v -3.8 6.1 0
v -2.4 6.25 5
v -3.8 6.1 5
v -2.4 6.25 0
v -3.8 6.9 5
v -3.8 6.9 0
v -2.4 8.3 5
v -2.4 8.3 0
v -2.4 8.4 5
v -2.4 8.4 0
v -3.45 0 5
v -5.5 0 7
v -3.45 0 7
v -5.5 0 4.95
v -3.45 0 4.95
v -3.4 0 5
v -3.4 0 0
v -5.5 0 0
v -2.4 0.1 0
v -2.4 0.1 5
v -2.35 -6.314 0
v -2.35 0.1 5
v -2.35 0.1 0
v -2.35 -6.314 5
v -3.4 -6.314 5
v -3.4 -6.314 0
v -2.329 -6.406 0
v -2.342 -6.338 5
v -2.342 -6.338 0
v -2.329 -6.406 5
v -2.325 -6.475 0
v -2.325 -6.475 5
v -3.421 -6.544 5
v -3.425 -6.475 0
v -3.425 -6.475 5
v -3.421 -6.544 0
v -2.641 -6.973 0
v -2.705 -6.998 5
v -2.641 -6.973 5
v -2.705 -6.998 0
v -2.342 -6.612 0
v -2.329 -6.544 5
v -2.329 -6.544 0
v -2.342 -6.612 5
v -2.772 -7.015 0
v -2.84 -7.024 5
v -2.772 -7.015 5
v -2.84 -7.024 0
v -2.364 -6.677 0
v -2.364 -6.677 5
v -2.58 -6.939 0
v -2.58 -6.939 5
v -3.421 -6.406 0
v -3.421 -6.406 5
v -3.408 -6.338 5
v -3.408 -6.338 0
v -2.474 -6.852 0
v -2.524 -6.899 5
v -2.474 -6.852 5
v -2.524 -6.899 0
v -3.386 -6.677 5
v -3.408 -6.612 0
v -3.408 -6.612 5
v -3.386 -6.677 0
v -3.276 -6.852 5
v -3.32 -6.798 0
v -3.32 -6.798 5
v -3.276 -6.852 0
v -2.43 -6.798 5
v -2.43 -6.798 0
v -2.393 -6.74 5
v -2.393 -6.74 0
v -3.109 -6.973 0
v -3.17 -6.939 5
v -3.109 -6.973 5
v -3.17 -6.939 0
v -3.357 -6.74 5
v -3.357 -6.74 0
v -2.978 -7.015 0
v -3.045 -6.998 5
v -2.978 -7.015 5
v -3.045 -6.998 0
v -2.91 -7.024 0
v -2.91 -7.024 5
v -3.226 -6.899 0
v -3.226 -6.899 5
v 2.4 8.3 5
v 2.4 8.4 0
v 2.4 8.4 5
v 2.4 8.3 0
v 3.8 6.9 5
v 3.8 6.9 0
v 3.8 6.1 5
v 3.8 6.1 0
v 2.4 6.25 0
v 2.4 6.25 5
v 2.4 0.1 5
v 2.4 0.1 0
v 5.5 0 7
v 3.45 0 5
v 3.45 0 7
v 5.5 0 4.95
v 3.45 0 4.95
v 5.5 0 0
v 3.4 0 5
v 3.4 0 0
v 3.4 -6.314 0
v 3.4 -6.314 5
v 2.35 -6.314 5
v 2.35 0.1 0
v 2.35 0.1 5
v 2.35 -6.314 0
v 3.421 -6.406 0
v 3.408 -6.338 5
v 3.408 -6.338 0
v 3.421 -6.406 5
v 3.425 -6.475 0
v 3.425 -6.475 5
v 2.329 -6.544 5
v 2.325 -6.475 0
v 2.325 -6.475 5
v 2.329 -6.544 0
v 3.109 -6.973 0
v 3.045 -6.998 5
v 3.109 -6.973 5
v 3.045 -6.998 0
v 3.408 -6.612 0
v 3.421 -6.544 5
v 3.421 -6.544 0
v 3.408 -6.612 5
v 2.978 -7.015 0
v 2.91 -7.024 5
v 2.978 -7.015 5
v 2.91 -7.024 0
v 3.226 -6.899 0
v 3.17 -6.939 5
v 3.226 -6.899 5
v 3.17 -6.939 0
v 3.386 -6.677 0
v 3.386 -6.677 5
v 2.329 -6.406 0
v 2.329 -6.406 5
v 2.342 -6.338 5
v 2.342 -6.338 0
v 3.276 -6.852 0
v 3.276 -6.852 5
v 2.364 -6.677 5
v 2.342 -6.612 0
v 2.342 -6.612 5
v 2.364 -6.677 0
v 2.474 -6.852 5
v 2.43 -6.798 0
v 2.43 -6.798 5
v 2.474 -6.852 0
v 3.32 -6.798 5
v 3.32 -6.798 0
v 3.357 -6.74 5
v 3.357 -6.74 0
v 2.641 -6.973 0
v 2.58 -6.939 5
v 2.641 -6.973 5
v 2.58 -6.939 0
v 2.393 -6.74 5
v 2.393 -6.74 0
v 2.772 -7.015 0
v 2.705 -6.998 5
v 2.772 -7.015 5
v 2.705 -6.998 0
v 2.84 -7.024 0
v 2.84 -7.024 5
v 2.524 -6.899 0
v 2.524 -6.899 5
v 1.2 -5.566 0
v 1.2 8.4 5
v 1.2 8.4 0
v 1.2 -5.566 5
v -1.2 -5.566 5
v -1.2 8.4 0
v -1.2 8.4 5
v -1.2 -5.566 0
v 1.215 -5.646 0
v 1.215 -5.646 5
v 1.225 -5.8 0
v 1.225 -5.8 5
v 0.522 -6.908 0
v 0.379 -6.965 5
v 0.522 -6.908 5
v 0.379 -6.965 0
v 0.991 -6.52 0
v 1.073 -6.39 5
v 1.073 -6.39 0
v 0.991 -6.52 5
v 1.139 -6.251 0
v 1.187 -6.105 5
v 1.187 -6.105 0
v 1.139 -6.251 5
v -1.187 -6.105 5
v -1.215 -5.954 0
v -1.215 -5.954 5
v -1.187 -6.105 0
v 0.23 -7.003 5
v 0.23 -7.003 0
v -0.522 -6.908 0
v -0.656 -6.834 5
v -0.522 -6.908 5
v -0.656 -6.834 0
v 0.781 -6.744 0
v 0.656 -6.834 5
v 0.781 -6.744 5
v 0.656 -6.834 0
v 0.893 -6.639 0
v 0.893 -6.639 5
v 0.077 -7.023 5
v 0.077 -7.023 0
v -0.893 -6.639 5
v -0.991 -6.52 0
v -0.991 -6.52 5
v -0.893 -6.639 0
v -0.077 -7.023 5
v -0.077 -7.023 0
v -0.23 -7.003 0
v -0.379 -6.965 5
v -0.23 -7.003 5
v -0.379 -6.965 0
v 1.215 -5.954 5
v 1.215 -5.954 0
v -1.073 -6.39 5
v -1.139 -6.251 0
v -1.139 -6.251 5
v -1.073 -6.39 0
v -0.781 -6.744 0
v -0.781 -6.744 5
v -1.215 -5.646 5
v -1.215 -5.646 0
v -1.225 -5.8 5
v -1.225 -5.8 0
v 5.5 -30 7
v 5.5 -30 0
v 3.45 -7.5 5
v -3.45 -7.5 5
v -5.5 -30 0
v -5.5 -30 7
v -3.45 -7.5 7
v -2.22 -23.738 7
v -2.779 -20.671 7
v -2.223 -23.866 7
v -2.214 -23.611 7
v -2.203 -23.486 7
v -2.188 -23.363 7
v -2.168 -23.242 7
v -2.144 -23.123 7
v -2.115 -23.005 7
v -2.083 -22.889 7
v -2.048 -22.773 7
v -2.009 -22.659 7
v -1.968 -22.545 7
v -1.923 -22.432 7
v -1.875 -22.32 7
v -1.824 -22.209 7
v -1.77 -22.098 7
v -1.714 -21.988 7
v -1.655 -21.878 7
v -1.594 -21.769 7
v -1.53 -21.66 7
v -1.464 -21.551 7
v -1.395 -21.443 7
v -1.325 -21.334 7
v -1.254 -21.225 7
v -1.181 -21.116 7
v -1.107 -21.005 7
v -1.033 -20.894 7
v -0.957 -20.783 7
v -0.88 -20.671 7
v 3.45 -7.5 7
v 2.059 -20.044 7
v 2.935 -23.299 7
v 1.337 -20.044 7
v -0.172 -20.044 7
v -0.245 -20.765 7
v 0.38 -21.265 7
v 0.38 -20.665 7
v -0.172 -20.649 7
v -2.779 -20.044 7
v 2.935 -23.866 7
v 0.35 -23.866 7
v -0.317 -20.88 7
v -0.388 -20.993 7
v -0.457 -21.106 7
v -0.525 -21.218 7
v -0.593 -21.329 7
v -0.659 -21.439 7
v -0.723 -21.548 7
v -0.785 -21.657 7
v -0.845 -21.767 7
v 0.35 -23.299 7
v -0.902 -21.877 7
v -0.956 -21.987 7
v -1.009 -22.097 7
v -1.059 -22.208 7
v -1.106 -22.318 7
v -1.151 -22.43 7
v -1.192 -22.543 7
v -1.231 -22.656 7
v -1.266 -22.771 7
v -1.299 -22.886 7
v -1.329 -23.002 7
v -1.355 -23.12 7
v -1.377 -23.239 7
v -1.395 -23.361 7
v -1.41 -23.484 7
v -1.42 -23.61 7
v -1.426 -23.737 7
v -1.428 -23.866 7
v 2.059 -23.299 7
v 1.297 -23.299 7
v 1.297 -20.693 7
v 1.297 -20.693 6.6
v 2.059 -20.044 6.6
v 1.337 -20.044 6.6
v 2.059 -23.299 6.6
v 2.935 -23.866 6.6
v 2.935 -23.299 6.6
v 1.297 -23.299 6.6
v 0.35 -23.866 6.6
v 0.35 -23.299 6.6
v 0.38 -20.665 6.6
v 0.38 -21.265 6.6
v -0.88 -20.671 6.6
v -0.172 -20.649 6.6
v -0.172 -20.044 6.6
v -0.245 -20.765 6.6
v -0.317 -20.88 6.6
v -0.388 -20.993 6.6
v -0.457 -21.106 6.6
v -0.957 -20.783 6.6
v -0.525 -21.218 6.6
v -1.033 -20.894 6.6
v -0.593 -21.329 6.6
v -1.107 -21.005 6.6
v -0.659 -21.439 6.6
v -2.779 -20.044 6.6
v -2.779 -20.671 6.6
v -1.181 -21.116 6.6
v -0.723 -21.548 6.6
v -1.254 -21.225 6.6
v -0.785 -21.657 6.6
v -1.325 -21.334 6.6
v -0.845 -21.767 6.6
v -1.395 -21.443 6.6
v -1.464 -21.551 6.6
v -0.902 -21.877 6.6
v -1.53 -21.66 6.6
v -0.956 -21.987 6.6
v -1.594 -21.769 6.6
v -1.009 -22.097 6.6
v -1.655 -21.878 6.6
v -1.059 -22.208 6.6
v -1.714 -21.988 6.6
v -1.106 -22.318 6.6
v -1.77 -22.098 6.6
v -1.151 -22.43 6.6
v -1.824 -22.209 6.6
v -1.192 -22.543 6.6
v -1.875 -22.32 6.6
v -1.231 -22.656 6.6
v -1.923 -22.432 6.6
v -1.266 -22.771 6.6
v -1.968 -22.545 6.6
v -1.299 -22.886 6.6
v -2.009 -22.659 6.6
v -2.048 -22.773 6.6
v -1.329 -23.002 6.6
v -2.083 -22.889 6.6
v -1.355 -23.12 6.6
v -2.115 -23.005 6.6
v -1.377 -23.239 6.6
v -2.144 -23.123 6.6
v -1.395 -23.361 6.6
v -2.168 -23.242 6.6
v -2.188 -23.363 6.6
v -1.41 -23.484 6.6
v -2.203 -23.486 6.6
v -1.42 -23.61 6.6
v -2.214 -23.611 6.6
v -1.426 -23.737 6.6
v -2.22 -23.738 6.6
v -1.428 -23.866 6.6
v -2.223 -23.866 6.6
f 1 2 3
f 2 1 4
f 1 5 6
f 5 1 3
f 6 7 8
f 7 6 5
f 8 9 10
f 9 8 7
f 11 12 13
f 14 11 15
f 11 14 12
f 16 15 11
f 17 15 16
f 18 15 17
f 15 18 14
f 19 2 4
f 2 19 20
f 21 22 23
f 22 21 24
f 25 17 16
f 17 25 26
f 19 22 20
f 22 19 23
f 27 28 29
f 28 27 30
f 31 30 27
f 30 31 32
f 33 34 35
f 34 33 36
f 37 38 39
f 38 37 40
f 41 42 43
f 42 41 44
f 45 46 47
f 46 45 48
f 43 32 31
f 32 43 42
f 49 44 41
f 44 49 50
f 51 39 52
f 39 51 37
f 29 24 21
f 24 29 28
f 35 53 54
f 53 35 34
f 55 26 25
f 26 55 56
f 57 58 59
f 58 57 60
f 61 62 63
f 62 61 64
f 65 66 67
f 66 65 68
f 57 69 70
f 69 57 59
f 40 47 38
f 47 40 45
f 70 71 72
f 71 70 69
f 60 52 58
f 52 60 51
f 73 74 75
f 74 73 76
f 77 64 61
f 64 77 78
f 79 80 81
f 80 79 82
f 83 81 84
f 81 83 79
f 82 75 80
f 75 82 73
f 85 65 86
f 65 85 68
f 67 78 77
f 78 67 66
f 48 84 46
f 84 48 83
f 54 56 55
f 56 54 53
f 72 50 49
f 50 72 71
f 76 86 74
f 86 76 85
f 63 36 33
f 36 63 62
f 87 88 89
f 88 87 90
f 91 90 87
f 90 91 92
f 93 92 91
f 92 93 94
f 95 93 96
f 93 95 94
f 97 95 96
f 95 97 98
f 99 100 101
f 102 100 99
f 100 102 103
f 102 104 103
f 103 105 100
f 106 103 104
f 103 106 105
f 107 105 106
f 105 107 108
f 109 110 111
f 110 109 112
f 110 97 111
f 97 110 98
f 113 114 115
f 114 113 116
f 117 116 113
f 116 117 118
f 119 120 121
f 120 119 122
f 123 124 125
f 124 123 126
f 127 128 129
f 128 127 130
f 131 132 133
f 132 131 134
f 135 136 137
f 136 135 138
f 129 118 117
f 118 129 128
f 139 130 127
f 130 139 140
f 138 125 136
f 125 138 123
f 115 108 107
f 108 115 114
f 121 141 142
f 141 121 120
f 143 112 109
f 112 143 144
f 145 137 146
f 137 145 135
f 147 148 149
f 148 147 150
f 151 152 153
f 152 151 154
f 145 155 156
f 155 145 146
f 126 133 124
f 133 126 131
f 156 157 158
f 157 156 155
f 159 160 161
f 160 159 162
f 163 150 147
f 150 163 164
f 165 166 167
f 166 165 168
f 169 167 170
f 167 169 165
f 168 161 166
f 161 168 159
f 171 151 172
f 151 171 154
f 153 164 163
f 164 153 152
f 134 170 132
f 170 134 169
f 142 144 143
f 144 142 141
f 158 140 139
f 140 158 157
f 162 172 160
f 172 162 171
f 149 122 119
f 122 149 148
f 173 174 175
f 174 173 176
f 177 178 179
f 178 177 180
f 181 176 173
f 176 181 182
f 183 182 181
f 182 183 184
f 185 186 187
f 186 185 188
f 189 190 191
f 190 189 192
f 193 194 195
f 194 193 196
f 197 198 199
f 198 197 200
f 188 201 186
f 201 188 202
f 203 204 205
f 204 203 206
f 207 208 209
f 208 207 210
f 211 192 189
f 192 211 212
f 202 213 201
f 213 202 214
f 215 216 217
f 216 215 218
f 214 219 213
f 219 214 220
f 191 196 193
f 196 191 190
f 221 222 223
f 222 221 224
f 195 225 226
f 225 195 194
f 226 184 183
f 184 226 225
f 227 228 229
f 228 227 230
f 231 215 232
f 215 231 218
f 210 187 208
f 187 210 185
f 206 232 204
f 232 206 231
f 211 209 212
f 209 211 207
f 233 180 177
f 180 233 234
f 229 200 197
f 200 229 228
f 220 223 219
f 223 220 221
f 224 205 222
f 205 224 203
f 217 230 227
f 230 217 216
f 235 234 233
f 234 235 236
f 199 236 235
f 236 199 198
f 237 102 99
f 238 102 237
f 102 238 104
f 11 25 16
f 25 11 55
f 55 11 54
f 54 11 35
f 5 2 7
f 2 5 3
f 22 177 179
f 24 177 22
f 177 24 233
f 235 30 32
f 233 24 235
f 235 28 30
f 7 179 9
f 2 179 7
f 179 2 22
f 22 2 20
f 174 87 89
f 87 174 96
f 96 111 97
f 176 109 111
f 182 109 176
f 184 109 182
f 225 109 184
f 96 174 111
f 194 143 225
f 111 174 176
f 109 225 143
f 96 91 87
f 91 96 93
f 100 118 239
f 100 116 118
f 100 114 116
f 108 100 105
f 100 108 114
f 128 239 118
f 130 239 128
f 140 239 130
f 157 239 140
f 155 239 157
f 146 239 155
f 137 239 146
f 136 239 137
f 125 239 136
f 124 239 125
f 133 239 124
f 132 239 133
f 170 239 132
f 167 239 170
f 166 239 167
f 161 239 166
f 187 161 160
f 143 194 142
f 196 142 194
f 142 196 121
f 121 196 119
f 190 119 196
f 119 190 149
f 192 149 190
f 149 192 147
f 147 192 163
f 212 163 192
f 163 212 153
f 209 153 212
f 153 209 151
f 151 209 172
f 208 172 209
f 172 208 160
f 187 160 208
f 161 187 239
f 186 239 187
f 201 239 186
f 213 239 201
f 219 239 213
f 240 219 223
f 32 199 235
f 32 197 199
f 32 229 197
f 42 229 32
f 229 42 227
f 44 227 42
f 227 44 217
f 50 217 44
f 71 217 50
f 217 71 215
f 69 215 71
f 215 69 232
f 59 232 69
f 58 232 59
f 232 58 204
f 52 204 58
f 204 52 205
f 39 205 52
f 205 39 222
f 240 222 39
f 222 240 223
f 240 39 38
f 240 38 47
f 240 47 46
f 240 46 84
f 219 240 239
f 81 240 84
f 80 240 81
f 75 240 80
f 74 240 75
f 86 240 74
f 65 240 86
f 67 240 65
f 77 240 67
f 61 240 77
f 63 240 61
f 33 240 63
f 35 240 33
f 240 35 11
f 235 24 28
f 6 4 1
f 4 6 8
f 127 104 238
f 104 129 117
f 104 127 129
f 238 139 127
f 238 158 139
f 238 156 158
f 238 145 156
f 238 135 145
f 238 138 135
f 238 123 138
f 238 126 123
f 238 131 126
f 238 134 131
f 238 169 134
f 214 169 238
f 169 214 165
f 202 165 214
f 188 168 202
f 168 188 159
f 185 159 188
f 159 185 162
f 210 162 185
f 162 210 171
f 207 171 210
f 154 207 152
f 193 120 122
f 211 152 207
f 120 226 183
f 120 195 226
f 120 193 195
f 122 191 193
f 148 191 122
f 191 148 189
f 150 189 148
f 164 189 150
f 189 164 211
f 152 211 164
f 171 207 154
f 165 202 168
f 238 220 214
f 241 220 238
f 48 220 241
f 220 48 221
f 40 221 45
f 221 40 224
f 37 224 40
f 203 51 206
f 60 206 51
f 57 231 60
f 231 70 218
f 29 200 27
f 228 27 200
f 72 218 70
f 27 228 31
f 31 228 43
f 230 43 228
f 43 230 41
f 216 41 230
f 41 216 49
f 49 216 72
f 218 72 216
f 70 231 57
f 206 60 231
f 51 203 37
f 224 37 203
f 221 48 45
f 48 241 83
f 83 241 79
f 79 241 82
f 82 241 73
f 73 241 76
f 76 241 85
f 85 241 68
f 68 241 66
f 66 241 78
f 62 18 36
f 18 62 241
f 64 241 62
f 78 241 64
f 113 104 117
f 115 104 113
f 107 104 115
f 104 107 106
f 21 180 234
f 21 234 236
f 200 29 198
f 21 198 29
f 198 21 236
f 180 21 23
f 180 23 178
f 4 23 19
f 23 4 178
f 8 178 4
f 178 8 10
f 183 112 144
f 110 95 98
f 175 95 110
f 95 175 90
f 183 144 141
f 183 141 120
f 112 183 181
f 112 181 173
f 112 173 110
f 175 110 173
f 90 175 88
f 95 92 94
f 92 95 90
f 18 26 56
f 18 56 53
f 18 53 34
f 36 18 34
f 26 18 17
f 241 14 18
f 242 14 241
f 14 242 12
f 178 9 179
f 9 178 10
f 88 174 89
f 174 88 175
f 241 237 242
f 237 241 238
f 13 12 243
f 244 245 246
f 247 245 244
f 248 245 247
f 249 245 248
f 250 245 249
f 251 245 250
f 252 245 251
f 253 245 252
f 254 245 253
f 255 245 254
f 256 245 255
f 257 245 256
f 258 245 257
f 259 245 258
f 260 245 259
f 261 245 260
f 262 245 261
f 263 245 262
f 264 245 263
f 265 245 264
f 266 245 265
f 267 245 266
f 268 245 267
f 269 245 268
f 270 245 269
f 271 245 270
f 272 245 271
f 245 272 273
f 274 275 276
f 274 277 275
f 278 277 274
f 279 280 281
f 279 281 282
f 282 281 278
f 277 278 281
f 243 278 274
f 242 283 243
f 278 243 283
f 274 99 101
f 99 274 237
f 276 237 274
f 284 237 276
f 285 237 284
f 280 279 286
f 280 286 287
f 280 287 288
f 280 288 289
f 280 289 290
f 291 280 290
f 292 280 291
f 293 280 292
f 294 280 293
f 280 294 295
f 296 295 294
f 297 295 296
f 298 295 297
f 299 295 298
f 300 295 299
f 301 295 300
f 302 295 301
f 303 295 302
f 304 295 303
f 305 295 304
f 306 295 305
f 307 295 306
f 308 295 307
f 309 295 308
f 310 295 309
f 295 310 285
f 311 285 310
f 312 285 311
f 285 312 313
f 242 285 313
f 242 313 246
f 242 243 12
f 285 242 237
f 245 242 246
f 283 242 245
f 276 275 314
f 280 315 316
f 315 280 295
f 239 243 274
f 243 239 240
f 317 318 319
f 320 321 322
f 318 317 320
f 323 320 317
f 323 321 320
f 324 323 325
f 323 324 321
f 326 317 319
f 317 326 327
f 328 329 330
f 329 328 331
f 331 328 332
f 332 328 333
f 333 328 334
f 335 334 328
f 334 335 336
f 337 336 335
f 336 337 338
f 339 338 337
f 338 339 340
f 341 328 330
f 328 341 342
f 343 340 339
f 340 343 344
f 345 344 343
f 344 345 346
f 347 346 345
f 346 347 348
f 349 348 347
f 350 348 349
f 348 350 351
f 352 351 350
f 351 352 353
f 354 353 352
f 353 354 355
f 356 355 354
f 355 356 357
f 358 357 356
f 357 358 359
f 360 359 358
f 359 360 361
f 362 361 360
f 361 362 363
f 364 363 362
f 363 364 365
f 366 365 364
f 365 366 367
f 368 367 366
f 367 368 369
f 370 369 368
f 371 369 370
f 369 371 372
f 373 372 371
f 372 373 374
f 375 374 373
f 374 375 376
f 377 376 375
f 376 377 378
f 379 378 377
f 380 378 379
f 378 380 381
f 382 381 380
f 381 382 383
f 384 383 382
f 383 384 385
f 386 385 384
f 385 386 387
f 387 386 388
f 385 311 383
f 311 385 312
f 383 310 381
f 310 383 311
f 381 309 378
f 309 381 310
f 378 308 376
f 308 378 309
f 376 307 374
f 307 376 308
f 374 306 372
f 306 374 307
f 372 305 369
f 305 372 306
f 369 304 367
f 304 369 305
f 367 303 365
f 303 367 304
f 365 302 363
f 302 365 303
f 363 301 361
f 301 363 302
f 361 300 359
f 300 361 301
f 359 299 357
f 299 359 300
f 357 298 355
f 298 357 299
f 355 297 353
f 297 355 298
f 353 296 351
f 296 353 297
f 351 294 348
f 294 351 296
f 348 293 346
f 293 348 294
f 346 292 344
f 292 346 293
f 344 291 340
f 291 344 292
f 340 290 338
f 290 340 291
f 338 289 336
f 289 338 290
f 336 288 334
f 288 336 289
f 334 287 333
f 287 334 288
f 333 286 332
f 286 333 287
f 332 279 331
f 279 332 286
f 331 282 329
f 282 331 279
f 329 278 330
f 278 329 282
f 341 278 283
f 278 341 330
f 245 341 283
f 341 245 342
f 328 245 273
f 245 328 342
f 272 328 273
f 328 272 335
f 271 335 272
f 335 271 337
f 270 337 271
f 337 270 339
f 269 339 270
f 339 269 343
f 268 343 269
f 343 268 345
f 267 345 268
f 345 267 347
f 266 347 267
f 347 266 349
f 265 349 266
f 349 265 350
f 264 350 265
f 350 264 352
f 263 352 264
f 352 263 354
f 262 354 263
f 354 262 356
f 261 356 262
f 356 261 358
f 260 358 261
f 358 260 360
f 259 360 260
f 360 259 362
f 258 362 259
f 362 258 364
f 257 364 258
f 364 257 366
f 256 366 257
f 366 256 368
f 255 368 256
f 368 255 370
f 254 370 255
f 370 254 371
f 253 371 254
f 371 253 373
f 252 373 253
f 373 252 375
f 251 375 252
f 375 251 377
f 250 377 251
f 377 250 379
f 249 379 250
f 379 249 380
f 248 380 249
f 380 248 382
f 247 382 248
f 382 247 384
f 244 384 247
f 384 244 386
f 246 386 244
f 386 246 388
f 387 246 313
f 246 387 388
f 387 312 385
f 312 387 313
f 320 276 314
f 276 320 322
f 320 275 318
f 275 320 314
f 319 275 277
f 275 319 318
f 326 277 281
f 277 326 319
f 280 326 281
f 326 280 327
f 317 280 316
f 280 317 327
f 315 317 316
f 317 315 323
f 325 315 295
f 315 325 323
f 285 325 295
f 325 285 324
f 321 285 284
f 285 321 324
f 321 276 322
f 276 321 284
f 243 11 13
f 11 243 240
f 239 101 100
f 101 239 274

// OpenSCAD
$fn = 50;

difference() {
	union() {
		translate(v = [0, 0, 0]) {
			rotate(a = [0, 0, 0]) {
				difference() {
					union() {
						translate(v = [0, 0, 0]) {
							rotate(a = [0, 0, 0]) {
								difference() {
									union() {
										translate(v = [-5.5, -30.0, 0]) {
											cube(size = [11.0, 38.4, 5.0]);
										}
									}
									union() {
										translate(v = [0, 0, -0.1]) {
											linear_extrude(height = 5.2) {
												polygon(points = [[-2.4, 0], [-2.4, 6.25], [-3.8, 6.1], [-3.8, 6.8999999999999995], [-2.4, 8.299999999999999], [-2.4, 9.399999999999999], [-5.7, 9.399999999999999], [-5.7, 0]]);
											}
										}
										translate(v = [0, 0, -0.1]) {
											linear_extrude(height = 5.2) {
												polygon(points = [[-2.35, -6.5], [-2.35, -6.3375], [-2.35, -6.175], [-2.35, -6.0125], [-2.35, -5.85], [-2.35, -5.6875], [-2.35, -5.525], [-2.35, -5.3625], [-2.35, -5.2], [-2.35, -5.0375], [-2.35, -4.875], [-2.35, -4.7125], [-2.35, -4.55], [-2.35, -4.3875], [-2.35, -4.225], [-2.35, -4.0625], [-2.35, -3.9], [-2.35, -3.7375], [-2.35, -3.575], [-2.35, -3.4125], [-2.35, -3.25], [-2.35, -3.0875], [-2.35, -2.925], [-2.35, -2.7625], [-2.35, -2.6], [-2.35, -2.4375], [-2.35, -2.2750000000000004], [-2.35, -2.1125], [-2.35, -1.9500000000000002], [-2.35, -1.7874999999999996], [-2.35, -1.625], [-2.35, -1.4625000000000004], [-2.35, -1.2999999999999998], [-2.35, -1.1375000000000002], [-2.35, -0.9749999999999996], [-2.35, -0.8125], [-2.35, -0.6500000000000004], [-2.35, -0.4874999999999998], [-2.35, -0.3250000000000002], [-2.35, -0.16249999999999964], [-2.35, 0.0], [-2.35, 0.1], [-3.4, 0.1], [-3.4, -6.5]]);
											}
										}
										translate(v = [-2.875, -6.475, -0.1]) {
											cylinder(h = 5.2, r = 0.55);
										}
										translate(v = [0, 0, -0.1]) {
											linear_extrude(height = 5.2) {
												polygon(points = [[2.4, 0], [2.4, 6.25], [3.8, 6.1], [3.8, 6.8999999999999995], [2.4, 8.299999999999999], [2.4, 9.399999999999999], [5.7, 9.399999999999999], [5.7, 0]]);
											}
										}
										translate(v = [0, 0, -0.1]) {
											linear_extrude(height = 5.2) {
												polygon(points = [[2.35, -6.5], [2.35, -6.3375], [2.35, -6.175], [2.35, -6.0125], [2.35, -5.85], [2.35, -5.6875], [2.35, -5.525], [2.35, -5.3625], [2.35, -5.2], [2.35, -5.0375], [2.35, -4.875], [2.35, -4.7125], [2.35, -4.55], [2.35, -4.3875], [2.35, -4.225], [2.35, -4.0625], [2.35, -3.9], [2.35, -3.7375], [2.35, -3.575], [2.35, -3.4125], [2.35, -3.25], [2.35, -3.0875], [2.35, -2.925], [2.35, -2.7625], [2.35, -2.6], [2.35, -2.4375], [2.35, -2.2750000000000004], [2.35, -2.1125], [2.35, -1.9500000000000002], [2.35, -1.7874999999999996], [2.35, -1.625], [2.35, -1.4625000000000004], [2.35, -1.2999999999999998], [2.35, -1.1375000000000002], [2.35, -0.9749999999999996], [2.35, -0.8125], [2.35, -0.6500000000000004], [2.35, -0.4874999999999998], [2.35, -0.3250000000000002], [2.35, -0.16249999999999964], [2.35, 0.0], [2.35, 0.1], [3.4, 0.1], [3.4, -6.5]]);
											}
										}
										translate(v = [2.875, -6.475, -0.1]) {
											cylinder(h = 5.2, r = 0.55);
										}
										translate(v = [0, 0, -0.1]) {
											linear_extrude(height = 5.2) {
												polygon(points = [[-1.2, -5.85], [-1.2, -5.632142857142857], [-1.2, -5.414285714285714], [-1.2, -5.196428571428571], [-1.2, -4.978571428571428], [-1.2, -4.760714285714285], [-1.2, -4.542857142857143], [-1.2, -4.324999999999999], [-1.2, -4.107142857142857], [-1.2, -3.8892857142857142], [-1.2, -3.6714285714285713], [-1.2, -3.4535714285714283], [-1.2, -3.2357142857142853], [-1.2, -3.0178571428571423], [-1.2, -2.8], [-1.2, -2.582142857142857], [-1.2, -2.364285714285714], [-1.2, -2.146428571428571], [-1.2, -1.9285714285714284], [-1.2, -1.7107142857142854], [-1.2, -1.4928571428571429], [-1.2, -1.2749999999999995], [-1.2, -1.057142857142857], [-1.2, -0.8392857142857135], [-1.2, -0.621428571428571], [-1.2, -0.40357142857142847], [-1.2, -0.18571428571428505], [-1.2, 0], [-1.2, 0.03214285714285747], [-1.2, 0.25], [-1.2, 0.4678571428571434], [-1.2, 0.6857142857142859], [-1.2, 0.9035714285714294], [-1.2, 1.1214285714285719], [-1.2, 1.3392857142857144], [-1.2, 1.5571428571428578], [-1.2, 1.7750000000000004], [-1.2, 1.9928571428571429], [-1.2, 2.2107142857142854], [-1.2, 2.428571428571429], [-1.2, 2.6464285714285722], [-1.2, 2.864285714285714], [-1.2, 3.0821428571428573], [-1.2, 3.3000000000000007], [-1.2, 3.5178571428571423], [-1.2, 3.7357142857142858], [-1.2, 3.953571428571429], [-1.2, 4.171428571428573], [-1.2, 4.389285714285714], [-1.2, 4.607142857142858], [-1.2, 4.825000000000001], [-1.2, 5.042857142857143], [-1.2, 5.260714285714286], [-1.2, 5.4785714285714295], [-1.2, 5.696428571428571], [-1.2, 5.914285714285715], [-1.2, 6.1], [-1.2, 6.132142857142858], [-1.2, 6.25], [-1.2, 6.35], [-1.2, 6.567857142857143], [-1.2, 6.7857142857142865], [-1.2, 7.003571428571428], [-1.2, 7.2214285714285715], [-1.2, 7.439285714285715], [-1.2, 7.657142857142858], [-1.2, 7.875], [-1.2, 8.092857142857143], [-1.2, 8.310714285714287], [-1.2, 8.528571428571428], [-1.2, 8.746428571428572], [-1.2, 8.964285714285715], [-1.2, 9.182142857142857], [-1.2, 9.4], [1.2, 9.4], [1.2, 9.182142857142857], [1.2, 8.964285714285715], [1.2, 8.746428571428572], [1.2, 8.528571428571428], [1.2, 8.310714285714287], [1.2, 8.092857142857143], [1.2, 7.875], [1.2, 7.657142857142858], [1.2, 7.439285714285715], [1.2, 7.2214285714285715], [1.2, 7.003571428571428], [1.2, 6.7857142857142865], [1.2, 6.567857142857143], [1.2, 6.35], [1.2, 6.25], [1.2, 6.132142857142858], [1.2, 6.1], [1.2, 5.914285714285715], [1.2, 5.696428571428571], [1.2, 5.4785714285714295], [1.2, 5.260714285714286], [1.2, 5.042857142857143], [1.2, 4.825000000000001], [1.2, 4.607142857142858], [1.2, 4.389285714285714], [1.2, 4.171428571428573], [1.2, 3.953571428571429], [1.2, 3.7357142857142858], [1.2, 3.5178571428571423], [1.2, 3.3000000000000007], [1.2, 3.0821428571428573], [1.2, 2.864285714285714], [1.2, 2.6464285714285722], [1.2, 2.428571428571429], [1.2, 2.2107142857142854], [1.2, 1.9928571428571429], [1.2, 1.7750000000000004], [1.2, 1.5571428571428578], [1.2, 1.3392857142857144], [1.2, 1.1214285714285719], [1.2, 0.9035714285714294], [1.2, 0.6857142857142859], [1.2, 0.4678571428571434], [1.2, 0.25], [1.2, 0.03214285714285747], [1.2, 0], [1.2, -0.18571428571428505], [1.2, -0.40357142857142847], [1.2, -0.621428571428571], [1.2, -0.8392857142857135], [1.2, -1.057142857142857], [1.2, -1.2749999999999995], [1.2, -1.4928571428571429], [1.2, -1.7107142857142854], [1.2, -1.9285714285714284], [1.2, -2.146428571428571], [1.2, -2.364285714285714], [1.2, -2.582142857142857], [1.2, -2.8], [1.2, -3.0178571428571423], [1.2, -3.2357142857142853], [1.2, -3.4535714285714283], [1.2, -3.6714285714285713], [1.2, -3.8892857142857142], [1.2, -4.107142857142857], [1.2, -4.324999999999999], [1.2, -4.542857142857143], [1.2, -4.760714285714285], [1.2, -4.978571428571428], [1.2, -5.196428571428571], [1.2, -5.414285714285714], [1.2, -5.632142857142857], [1.2, -5.85]]);
											}
										}
										translate(v = [0, -5.8, -0.1]) {
											cylinder(h = 5.2, r = 1.2249999999999999);
										}
										translate(v = [0, -22, 6.6]) {
											linear_extrude(height = 0.5) {
												text(font = "Arial:style=Bold", halign = "center", size = 4.0, text = "71", valign = "center");
											}
										}
									}
								}
							}
						}
						translate(v = [0, 0, 0]) {
							rotate(a = [0, 0, 0]) {
								difference() {
									union() {
										translate(v = [-5.5, -30.0, 4.95]) {
											cube(size = [11.0, 22.5, 2.05]);
										}
									}
									union() {
										translate(v = [0, -22, 6.6]) {
											linear_extrude(height = 0.5) {
												text(font = "Arial:style=Bold", halign = "center", size = 4.0, text = "71", valign = "center");
											}
										}
									}
								}
							}
						}
						translate(v = [-5.5, -30.0, 4.95]) {
							cube(size = [2.0500000000000003, 30.0, 2.05]);
						}
						translate(v = [3.4499999999999997, -30.0, 4.95]) {
							cube(size = [2.0500000000000003, 30.0, 2.05]);
						}
					}
					union();
				}
			}
		}
	}
	union();
}
